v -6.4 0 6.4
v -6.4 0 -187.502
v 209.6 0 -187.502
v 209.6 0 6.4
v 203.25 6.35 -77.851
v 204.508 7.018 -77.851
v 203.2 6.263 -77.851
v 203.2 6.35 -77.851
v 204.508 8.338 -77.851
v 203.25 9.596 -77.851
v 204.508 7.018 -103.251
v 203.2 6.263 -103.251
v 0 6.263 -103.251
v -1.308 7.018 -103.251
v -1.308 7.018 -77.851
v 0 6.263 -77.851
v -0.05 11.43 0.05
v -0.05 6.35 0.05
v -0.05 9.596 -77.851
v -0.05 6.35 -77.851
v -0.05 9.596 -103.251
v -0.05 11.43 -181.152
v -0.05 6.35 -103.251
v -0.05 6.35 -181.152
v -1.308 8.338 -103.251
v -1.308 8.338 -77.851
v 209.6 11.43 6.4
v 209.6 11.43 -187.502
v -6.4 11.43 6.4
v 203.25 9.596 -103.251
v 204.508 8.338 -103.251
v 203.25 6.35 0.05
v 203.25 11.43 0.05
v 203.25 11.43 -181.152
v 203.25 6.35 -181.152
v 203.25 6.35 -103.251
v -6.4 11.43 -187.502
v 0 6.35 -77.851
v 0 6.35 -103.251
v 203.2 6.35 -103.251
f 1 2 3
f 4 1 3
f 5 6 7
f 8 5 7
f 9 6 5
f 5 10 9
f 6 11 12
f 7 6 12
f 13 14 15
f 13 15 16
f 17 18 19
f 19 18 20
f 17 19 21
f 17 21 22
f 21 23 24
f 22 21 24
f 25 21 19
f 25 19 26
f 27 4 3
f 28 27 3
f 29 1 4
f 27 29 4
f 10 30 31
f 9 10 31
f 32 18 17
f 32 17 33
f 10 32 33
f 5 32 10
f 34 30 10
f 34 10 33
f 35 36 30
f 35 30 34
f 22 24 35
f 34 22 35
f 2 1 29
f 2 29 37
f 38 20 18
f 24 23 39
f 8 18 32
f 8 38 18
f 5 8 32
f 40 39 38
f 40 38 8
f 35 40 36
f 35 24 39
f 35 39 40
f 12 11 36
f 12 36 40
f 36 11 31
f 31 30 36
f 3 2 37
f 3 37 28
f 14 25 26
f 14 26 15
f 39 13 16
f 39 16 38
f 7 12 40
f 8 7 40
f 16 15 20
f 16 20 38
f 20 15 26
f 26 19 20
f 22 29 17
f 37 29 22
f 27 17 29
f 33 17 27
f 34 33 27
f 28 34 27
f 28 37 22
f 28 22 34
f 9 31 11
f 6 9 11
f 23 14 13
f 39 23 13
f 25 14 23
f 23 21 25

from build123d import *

# Parameters (mm, degrees)
SKETCH2_W           = 216
SKETCH2_H           = 193.902
SKETCH2_W_2         = 203.3
SKETCH2_H_2         = 181.202
BOSS_EXTRUDE1_DEPTH = 12.7
SKETCH2_3_W         = 203.3
SKETCH2_3_H         = 181.202
BOSS_EXTRUDE2_DEPTH = 6.35
CUT_EXTRUDE1_DEPTH  = 12.7
SKETCH5_W           = 216
SKETCH5_H           = 193.902
CUT_EXTRUDE2_DEPTH  = 1.27


with BuildPart() as part:
    # Sketch2 → Boss-Extrude1 (new body)
    with BuildSketch(Plane(origin=(0, 0, 0), x_dir=(1, 0, 0), z_dir=(0, 1, 0))):
        with Locations((101.6, 90.551)):
            Rectangle(SKETCH2_W, SKETCH2_H)
        with Locations((101.6, 90.551)):
            Rectangle(SKETCH2_W_2, SKETCH2_H_2, mode=Mode.SUBTRACT)
    extrude(amount=BOSS_EXTRUDE1_DEPTH)

    # Sketch2<3> → Boss-Extrude2 (add)
    with BuildSketch(Plane(origin=(0, 0, 0), x_dir=(1, 0, 0), z_dir=(0, 1, 0))):
        with Locations((101.6, 90.551)):
            Rectangle(SKETCH2_3_W, SKETCH2_3_H)
    extrude(amount=BOSS_EXTRUDE2_DEPTH)

    # Sketch4 → Cut-Extrude1 (cut, symmetric)
    with BuildSketch(Plane(origin=(0, 0, -90.551), x_dir=(-1, 0, 0), z_dir=(0, 0, -1))):
        Polygon((-203.2, 9.645710678), (-204.507721606, 8.337989072), (-204.507721606, 7.018410881), (-203.2, 6.26339746), align=None)
    cut_extrude1 = extrude(amount=CUT_EXTRUDE1_DEPTH, both=True, mode=Mode.SUBTRACT)

    # Sketch5 → Cut-Extrude2 (cut)
    with BuildSketch(Plane(origin=(0, 12.7, 0), x_dir=(1, 0, 0), z_dir=(0, 1, 0))):
        with Locations((101.6, 90.551)):
            Rectangle(SKETCH5_W, SKETCH5_H)
        Polygon((203.2, 77.851), (203.2, 103.251), (203.25, 103.251), (203.25, 181.152), (-0.05, 181.152), (-0.05, -0.05), (203.25, -0.05), (203.25, 77.851), align=None, mode=Mode.SUBTRACT)
    extrude(amount=-CUT_EXTRUDE2_DEPTH, mode=Mode.SUBTRACT)

    # Mirror1: Cut-Extrude1 across plane
    add(cut_extrude1.mirror(Plane.ZY.offset(-101.6)), mode=Mode.SUBTRACT)


solid = part.part
